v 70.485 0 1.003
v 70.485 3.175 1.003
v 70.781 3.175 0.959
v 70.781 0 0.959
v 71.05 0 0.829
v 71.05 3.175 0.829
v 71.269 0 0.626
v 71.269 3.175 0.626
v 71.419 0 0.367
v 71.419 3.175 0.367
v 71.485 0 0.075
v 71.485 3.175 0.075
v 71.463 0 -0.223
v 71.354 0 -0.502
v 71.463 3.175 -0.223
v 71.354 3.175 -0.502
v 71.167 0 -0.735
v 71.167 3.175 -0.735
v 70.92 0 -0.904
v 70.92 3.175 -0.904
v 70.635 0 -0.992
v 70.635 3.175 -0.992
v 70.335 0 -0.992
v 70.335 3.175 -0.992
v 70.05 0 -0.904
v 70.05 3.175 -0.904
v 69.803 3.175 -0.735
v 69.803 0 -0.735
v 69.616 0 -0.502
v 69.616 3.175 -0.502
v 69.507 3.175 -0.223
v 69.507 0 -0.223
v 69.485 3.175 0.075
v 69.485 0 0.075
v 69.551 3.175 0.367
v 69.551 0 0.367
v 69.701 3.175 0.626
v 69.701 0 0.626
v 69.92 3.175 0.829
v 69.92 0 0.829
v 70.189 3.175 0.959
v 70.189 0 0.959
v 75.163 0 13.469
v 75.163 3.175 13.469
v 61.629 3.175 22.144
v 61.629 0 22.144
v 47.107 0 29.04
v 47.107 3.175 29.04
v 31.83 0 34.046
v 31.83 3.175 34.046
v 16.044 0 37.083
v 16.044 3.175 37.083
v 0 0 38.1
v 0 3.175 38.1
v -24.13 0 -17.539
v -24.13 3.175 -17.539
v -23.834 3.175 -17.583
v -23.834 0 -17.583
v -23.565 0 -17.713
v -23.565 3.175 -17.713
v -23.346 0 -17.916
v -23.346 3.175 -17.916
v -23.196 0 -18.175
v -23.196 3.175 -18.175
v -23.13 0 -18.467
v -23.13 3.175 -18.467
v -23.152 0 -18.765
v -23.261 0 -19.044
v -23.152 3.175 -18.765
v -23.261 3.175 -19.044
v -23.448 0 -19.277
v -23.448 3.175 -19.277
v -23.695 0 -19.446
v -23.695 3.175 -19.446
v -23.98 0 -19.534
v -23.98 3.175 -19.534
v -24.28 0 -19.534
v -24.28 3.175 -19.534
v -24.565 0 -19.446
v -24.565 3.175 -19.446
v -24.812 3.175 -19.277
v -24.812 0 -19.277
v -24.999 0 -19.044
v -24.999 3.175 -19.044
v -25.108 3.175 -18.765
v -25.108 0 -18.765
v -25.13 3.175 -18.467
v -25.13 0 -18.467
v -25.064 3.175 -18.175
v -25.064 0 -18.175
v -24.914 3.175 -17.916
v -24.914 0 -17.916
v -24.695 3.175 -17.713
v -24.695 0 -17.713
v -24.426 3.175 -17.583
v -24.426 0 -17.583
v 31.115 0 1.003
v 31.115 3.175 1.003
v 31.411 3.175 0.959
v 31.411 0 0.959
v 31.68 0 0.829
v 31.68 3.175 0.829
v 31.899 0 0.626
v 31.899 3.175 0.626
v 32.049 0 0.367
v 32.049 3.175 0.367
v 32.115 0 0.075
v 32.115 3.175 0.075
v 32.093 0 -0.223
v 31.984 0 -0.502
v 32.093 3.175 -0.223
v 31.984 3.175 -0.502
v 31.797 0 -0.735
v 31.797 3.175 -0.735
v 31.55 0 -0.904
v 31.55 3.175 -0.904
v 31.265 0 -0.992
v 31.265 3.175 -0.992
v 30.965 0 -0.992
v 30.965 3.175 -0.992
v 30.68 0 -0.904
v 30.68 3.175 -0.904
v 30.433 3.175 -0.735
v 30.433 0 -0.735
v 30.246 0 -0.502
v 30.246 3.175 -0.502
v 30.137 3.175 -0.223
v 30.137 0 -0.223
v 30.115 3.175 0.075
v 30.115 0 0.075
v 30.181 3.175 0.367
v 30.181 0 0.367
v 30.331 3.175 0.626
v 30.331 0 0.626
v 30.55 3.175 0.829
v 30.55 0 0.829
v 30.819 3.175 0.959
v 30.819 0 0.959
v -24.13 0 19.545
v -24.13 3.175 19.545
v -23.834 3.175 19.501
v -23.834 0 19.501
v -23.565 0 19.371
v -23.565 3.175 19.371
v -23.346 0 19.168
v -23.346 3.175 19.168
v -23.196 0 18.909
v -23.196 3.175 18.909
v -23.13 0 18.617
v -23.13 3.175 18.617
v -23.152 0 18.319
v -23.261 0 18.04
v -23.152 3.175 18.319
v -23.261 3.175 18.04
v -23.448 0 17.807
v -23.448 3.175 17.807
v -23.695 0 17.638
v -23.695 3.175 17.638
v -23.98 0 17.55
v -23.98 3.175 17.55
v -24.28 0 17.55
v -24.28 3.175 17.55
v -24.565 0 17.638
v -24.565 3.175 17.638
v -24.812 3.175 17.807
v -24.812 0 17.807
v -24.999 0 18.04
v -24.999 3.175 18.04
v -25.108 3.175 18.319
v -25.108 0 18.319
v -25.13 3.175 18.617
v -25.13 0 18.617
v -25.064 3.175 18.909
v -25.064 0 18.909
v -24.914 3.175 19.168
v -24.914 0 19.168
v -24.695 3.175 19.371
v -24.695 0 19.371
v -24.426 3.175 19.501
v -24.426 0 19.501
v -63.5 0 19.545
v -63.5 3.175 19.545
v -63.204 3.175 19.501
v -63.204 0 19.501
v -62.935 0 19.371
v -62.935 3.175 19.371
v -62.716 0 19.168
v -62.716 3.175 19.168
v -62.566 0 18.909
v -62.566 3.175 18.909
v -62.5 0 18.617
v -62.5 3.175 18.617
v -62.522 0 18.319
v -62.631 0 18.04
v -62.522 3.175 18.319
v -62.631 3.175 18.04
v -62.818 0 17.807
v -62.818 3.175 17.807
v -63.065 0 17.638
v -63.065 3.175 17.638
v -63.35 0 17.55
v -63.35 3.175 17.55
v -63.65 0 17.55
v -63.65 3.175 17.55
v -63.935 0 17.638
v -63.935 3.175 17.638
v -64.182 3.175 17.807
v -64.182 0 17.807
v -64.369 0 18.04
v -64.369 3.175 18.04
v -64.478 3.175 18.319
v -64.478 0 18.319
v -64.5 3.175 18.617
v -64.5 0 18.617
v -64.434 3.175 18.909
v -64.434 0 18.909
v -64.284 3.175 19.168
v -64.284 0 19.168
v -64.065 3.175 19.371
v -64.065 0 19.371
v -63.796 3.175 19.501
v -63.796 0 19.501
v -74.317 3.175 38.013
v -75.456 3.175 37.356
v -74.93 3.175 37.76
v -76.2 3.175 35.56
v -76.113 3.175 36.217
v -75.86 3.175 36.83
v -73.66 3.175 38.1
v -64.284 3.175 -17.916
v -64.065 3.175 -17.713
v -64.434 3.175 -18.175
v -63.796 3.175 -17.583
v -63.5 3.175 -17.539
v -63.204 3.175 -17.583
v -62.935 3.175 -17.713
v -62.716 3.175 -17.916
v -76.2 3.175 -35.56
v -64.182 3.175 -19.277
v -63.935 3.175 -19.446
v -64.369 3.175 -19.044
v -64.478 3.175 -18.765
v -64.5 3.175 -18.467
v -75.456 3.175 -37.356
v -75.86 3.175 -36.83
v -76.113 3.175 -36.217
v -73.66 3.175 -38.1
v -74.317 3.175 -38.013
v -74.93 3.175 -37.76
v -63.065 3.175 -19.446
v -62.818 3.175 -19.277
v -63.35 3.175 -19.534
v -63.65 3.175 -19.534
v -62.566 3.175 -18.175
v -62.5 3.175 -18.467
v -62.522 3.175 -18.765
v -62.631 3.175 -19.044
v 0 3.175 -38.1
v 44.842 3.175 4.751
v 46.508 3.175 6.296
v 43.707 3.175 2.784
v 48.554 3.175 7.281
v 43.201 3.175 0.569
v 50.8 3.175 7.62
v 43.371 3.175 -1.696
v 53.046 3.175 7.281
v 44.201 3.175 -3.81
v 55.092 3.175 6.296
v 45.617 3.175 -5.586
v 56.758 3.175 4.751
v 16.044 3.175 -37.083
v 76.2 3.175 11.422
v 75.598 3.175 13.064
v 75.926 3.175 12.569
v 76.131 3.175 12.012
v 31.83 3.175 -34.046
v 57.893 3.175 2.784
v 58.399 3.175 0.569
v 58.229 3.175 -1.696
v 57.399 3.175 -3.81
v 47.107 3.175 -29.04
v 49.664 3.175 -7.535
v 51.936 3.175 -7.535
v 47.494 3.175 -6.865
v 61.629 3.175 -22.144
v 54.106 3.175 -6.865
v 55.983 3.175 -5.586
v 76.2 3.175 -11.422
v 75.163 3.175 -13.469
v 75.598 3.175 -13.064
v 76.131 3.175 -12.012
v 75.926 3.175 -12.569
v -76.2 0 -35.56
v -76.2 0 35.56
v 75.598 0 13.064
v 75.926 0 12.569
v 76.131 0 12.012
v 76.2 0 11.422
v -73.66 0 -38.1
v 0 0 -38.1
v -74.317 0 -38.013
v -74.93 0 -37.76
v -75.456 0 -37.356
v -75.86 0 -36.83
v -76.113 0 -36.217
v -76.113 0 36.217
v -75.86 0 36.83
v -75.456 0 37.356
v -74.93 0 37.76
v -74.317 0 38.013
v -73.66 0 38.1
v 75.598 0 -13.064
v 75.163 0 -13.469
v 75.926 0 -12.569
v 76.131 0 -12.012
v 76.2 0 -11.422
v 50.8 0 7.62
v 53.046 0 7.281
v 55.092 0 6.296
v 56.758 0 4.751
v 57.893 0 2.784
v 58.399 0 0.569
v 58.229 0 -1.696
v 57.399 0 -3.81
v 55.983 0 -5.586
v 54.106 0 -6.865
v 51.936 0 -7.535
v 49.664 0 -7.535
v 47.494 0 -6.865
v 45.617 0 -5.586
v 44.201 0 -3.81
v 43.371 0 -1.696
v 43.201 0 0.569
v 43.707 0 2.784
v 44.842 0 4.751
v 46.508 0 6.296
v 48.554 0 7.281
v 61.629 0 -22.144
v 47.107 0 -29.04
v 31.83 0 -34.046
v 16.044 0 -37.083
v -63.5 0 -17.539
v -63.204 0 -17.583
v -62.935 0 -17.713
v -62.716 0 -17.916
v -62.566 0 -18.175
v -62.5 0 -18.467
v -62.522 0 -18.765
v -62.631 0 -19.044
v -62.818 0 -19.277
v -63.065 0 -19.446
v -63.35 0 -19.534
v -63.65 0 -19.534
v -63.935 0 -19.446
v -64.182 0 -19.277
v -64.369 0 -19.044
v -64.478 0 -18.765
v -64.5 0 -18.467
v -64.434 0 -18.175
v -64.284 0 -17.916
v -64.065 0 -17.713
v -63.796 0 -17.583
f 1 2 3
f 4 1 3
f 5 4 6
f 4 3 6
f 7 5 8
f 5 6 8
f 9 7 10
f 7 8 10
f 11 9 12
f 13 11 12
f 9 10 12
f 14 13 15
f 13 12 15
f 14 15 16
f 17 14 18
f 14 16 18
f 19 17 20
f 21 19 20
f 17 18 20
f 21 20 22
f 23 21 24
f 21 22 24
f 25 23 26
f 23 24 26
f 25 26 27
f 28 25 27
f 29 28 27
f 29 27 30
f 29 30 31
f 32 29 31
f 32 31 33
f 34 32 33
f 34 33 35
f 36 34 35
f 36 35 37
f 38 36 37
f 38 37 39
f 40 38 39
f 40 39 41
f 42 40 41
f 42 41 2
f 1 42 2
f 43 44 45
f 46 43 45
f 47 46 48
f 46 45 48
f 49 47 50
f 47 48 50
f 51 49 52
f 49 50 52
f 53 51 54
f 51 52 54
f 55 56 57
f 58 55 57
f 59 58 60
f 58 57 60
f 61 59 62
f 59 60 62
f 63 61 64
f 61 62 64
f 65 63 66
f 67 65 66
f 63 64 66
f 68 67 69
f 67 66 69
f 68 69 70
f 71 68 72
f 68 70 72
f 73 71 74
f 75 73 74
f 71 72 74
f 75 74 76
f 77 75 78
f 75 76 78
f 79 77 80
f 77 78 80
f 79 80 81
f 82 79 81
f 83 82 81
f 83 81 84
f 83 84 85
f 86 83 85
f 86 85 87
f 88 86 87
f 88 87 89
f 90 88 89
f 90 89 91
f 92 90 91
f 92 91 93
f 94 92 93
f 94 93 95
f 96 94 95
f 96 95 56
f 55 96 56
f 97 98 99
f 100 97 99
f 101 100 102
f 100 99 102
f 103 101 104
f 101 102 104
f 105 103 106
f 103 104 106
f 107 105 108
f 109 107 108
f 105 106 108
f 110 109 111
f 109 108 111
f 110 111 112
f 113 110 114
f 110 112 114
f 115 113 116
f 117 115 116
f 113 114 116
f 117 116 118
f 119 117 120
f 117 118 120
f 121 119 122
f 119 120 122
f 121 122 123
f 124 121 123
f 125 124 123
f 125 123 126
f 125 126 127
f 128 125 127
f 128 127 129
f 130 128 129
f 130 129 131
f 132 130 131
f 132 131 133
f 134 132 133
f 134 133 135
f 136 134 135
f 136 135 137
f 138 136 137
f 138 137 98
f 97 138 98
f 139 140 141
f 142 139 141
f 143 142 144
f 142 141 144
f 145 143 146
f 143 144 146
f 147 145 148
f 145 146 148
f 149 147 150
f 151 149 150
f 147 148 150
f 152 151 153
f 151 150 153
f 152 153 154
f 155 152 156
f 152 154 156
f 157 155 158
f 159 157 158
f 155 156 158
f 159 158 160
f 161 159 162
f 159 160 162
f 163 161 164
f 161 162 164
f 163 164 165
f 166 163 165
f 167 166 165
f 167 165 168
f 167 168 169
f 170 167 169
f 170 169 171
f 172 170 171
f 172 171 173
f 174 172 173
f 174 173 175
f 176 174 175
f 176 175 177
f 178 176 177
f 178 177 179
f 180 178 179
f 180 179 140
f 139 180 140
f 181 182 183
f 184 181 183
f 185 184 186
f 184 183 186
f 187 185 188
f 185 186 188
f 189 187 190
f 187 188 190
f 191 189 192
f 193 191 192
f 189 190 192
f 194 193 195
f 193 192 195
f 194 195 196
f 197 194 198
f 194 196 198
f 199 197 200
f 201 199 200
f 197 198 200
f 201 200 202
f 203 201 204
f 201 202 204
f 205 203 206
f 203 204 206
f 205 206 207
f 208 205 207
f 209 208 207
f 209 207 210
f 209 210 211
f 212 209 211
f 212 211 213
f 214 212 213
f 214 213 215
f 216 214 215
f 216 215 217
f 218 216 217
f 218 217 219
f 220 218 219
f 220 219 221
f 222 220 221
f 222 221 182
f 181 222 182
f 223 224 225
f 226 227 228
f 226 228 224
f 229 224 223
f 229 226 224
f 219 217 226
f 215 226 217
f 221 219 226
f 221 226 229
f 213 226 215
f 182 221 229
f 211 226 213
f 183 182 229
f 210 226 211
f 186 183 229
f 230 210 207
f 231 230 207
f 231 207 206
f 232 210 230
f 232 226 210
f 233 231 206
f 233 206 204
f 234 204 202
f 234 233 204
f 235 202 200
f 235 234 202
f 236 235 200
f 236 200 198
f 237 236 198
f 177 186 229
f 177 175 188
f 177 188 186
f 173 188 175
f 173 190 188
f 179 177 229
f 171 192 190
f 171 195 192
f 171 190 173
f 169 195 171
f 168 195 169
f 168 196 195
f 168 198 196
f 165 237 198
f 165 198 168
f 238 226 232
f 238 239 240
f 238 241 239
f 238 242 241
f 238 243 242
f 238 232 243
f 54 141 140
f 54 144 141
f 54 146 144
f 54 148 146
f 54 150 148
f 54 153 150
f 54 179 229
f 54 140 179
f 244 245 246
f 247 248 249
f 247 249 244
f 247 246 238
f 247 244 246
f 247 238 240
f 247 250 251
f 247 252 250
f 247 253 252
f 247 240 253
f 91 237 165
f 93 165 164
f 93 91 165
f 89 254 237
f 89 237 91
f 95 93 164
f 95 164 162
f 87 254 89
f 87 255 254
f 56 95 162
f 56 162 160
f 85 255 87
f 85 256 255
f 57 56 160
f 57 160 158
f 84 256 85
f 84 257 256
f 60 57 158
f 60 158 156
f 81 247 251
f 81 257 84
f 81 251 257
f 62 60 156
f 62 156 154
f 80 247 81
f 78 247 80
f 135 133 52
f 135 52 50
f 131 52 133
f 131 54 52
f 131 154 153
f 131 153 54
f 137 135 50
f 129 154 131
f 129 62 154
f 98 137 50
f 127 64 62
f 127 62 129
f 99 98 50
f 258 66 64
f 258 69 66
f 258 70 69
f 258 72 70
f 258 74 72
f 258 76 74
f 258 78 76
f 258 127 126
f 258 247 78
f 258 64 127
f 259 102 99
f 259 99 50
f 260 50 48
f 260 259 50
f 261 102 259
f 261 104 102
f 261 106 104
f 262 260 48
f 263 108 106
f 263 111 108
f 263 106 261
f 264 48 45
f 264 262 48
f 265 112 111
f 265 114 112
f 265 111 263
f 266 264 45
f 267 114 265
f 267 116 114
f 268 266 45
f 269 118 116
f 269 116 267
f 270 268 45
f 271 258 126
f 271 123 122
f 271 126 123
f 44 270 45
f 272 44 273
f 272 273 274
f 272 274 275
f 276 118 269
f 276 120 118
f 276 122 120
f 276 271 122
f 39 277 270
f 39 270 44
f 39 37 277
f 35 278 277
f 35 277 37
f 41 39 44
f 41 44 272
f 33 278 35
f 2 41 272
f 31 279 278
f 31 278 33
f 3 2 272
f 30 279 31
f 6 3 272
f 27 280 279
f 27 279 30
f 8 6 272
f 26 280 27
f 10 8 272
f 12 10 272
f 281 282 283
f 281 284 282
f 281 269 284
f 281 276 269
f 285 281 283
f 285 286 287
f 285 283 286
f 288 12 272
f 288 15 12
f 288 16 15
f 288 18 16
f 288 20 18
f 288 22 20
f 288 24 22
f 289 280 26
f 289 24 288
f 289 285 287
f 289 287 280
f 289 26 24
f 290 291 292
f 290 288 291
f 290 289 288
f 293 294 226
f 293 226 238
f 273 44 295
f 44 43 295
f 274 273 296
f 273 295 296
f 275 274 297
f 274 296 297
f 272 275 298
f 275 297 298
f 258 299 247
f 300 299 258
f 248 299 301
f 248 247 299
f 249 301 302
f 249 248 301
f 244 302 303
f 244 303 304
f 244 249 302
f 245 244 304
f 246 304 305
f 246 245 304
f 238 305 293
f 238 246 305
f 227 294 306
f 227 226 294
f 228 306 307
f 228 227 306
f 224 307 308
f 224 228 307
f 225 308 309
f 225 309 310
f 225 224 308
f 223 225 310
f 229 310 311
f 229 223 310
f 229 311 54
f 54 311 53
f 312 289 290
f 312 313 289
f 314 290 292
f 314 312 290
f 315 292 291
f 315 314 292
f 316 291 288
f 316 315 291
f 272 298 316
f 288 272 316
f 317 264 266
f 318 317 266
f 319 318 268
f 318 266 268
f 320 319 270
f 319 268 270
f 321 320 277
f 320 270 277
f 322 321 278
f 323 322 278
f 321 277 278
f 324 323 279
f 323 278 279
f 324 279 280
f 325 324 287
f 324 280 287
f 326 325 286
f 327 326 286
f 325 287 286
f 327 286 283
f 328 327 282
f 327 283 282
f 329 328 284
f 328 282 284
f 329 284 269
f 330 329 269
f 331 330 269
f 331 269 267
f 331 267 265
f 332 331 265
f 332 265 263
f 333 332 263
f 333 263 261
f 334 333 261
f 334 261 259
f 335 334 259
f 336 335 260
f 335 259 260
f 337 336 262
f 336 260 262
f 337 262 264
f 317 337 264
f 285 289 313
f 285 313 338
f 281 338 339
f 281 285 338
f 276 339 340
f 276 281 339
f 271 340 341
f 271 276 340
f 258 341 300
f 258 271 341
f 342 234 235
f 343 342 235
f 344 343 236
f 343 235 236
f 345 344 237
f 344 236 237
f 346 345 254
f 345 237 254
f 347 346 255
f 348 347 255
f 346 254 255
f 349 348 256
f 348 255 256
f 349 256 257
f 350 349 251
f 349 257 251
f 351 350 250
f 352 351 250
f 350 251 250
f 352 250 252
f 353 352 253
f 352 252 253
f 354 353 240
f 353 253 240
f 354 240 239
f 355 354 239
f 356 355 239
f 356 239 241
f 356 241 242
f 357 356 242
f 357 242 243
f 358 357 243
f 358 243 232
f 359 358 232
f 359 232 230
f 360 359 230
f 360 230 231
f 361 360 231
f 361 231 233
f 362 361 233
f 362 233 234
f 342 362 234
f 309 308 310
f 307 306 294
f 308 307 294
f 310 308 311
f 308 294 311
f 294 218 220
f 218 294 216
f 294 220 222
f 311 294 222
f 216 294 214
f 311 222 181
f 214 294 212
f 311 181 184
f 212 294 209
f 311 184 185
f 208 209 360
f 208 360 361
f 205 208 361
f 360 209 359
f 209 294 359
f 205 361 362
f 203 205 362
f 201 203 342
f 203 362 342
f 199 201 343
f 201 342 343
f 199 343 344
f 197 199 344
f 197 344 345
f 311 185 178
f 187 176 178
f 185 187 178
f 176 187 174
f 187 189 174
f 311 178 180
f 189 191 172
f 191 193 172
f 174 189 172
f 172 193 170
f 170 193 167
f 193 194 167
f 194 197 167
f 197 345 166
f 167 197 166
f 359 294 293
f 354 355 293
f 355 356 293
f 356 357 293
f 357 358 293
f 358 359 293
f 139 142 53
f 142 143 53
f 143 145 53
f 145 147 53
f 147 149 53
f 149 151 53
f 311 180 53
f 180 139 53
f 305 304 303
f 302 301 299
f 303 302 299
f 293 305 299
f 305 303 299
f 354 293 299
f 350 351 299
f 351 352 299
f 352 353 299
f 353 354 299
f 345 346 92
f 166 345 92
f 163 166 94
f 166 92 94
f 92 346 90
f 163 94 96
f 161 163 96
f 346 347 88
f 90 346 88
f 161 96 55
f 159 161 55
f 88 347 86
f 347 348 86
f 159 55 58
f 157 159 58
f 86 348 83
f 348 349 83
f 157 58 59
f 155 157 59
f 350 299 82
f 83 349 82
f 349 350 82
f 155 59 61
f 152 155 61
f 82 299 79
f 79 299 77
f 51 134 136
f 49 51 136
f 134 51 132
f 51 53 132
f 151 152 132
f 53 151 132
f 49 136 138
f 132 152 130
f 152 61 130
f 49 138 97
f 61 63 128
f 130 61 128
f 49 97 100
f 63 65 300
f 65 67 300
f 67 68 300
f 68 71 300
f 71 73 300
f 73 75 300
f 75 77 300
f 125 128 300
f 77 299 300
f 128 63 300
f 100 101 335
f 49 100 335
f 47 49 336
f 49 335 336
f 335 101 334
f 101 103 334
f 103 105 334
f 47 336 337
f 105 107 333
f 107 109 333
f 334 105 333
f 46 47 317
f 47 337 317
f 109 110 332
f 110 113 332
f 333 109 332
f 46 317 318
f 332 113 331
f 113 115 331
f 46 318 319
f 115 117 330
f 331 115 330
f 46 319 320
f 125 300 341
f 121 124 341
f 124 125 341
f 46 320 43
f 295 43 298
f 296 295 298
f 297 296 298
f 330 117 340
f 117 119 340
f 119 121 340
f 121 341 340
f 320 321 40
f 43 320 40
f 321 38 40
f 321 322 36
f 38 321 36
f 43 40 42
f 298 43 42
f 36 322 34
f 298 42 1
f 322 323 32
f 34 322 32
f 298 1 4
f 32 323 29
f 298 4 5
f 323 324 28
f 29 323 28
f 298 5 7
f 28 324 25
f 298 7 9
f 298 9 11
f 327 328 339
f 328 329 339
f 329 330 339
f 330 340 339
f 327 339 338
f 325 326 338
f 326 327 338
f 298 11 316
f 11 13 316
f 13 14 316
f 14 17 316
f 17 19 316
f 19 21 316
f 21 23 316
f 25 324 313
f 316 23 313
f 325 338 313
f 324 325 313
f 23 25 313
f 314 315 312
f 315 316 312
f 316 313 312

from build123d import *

# Parameters (mm, degrees)
SKETCH1_W           = 152.4
SKETCH1_H           = 76.2
BOSS_EXTRUDE1_DEPTH = 3.175
CUT_EXTRUDE1_DEPTH  = 3.175
FILLET2_R           = 2.54
FILLET3_R           = 2.54
SKETCH5_R           = 7.62
CUT_EXTRUDE2_DEPTH  = 3.175
SKETCH7_R           = 1.0033
CUT_EXTRUDE4_DEPTH  = 86.253332046
SKETCH6_R           = 1.0033
CUT_EXTRUDE5_DEPTH  = 86.253332046


with BuildPart() as part:
    # Sketch1 → Boss-Extrude1 (new body)
    with BuildSketch(Plane(origin=(0, 0, 0), x_dir=(1, 0, 0), z_dir=(0, 1, 0))):
        Rectangle(SKETCH1_W, SKETCH1_H)
    extrude(amount=BOSS_EXTRUDE1_DEPTH)

    # Sketch4 → Cut-Extrude1 (cut)
    with BuildSketch(Plane(origin=(0, 3.175, 0), x_dir=(1, 0, 0), z_dir=(0, 1, 0))):
        with BuildLine():
            Line((0, 38.1), (76.2, 38.1))
            Line((76.2, 38.1), (76.2, 12.7))
            ThreePointArc((76.2, 12.7), (40.160926284, 31.582778852), (0, 38.1))
        make_face()
        with BuildLine():
            Line((76.2, -38.1), (76.2, -12.7))
            ThreePointArc((76.2, -12.7), (40.160926284, -31.582778852), (0, -38.1))
            Line((0, -38.1), (76.2, -38.1))
        make_face()
    extrude(amount=-CUT_EXTRUDE1_DEPTH, mode=Mode.SUBTRACT)

    # Fillet2
    fillet2_edges = [part.edges().sort_by_distance(p)[0] for p in [
        (76.2, 1.5875, -12.7),
        (76.2, 1.5875, 12.7),
    ]]
    fillet(fillet2_edges, radius=FILLET2_R)

    # Fillet3
    fillet3_edges = [part.edges().sort_by_distance(p)[0] for p in [
        (-76.2, 1.5875, -38.1),
        (-76.2, 1.5875, 38.1),
    ]]
    fillet(fillet3_edges, radius=FILLET3_R)

    # Sketch5 → Cut-Extrude2 (cut)
    with BuildSketch(Plane(origin=(0, 3.175, 0), x_dir=(1, 0, 0), z_dir=(0, 1, 0))):
        with Locations(Location((50.8, 0, 0), (0, 0, 270))):
            Circle(SKETCH5_R)
    extrude(amount=-CUT_EXTRUDE2_DEPTH, mode=Mode.SUBTRACT)

    # Sketch7 → Cut-Extrude4 (cut, through all)
    with BuildSketch(Plane(origin=(0, 3.175, 0), x_dir=(1, 0, 0), z_dir=(0, 1, 0))):
        with Locations(Location((70.485, 0, 0), (0, 0, 270))):
            Circle(SKETCH7_R)
        with Locations(Location((31.115, 0, 0), (0, 0, 270))):
            Circle(SKETCH7_R)
    extrude(amount=-CUT_EXTRUDE4_DEPTH, mode=Mode.SUBTRACT)

    # Sketch6 → Cut-Extrude5 (cut, through all)
    with BuildSketch(Plane(origin=(0, 3.175, 0), x_dir=(1, 0, 0), z_dir=(0, 1, 0))):
        with Locations(Location((-63.5, 18.542, 0), (0, 0, 270))):
            Circle(SKETCH6_R)
        with Locations(Location((-24.13, 18.542, 0), (0, 0, 270))):
            Circle(SKETCH6_R)
        with Locations(Location((-24.13, -18.542, 0), (0, 0, 270))):
            Circle(SKETCH6_R)
        with Locations(Location((-63.5, -18.542, 0), (0, 0, 270))):
            Circle(SKETCH6_R)
    extrude(amount=-CUT_EXTRUDE5_DEPTH, mode=Mode.SUBTRACT)


solid = part.part
